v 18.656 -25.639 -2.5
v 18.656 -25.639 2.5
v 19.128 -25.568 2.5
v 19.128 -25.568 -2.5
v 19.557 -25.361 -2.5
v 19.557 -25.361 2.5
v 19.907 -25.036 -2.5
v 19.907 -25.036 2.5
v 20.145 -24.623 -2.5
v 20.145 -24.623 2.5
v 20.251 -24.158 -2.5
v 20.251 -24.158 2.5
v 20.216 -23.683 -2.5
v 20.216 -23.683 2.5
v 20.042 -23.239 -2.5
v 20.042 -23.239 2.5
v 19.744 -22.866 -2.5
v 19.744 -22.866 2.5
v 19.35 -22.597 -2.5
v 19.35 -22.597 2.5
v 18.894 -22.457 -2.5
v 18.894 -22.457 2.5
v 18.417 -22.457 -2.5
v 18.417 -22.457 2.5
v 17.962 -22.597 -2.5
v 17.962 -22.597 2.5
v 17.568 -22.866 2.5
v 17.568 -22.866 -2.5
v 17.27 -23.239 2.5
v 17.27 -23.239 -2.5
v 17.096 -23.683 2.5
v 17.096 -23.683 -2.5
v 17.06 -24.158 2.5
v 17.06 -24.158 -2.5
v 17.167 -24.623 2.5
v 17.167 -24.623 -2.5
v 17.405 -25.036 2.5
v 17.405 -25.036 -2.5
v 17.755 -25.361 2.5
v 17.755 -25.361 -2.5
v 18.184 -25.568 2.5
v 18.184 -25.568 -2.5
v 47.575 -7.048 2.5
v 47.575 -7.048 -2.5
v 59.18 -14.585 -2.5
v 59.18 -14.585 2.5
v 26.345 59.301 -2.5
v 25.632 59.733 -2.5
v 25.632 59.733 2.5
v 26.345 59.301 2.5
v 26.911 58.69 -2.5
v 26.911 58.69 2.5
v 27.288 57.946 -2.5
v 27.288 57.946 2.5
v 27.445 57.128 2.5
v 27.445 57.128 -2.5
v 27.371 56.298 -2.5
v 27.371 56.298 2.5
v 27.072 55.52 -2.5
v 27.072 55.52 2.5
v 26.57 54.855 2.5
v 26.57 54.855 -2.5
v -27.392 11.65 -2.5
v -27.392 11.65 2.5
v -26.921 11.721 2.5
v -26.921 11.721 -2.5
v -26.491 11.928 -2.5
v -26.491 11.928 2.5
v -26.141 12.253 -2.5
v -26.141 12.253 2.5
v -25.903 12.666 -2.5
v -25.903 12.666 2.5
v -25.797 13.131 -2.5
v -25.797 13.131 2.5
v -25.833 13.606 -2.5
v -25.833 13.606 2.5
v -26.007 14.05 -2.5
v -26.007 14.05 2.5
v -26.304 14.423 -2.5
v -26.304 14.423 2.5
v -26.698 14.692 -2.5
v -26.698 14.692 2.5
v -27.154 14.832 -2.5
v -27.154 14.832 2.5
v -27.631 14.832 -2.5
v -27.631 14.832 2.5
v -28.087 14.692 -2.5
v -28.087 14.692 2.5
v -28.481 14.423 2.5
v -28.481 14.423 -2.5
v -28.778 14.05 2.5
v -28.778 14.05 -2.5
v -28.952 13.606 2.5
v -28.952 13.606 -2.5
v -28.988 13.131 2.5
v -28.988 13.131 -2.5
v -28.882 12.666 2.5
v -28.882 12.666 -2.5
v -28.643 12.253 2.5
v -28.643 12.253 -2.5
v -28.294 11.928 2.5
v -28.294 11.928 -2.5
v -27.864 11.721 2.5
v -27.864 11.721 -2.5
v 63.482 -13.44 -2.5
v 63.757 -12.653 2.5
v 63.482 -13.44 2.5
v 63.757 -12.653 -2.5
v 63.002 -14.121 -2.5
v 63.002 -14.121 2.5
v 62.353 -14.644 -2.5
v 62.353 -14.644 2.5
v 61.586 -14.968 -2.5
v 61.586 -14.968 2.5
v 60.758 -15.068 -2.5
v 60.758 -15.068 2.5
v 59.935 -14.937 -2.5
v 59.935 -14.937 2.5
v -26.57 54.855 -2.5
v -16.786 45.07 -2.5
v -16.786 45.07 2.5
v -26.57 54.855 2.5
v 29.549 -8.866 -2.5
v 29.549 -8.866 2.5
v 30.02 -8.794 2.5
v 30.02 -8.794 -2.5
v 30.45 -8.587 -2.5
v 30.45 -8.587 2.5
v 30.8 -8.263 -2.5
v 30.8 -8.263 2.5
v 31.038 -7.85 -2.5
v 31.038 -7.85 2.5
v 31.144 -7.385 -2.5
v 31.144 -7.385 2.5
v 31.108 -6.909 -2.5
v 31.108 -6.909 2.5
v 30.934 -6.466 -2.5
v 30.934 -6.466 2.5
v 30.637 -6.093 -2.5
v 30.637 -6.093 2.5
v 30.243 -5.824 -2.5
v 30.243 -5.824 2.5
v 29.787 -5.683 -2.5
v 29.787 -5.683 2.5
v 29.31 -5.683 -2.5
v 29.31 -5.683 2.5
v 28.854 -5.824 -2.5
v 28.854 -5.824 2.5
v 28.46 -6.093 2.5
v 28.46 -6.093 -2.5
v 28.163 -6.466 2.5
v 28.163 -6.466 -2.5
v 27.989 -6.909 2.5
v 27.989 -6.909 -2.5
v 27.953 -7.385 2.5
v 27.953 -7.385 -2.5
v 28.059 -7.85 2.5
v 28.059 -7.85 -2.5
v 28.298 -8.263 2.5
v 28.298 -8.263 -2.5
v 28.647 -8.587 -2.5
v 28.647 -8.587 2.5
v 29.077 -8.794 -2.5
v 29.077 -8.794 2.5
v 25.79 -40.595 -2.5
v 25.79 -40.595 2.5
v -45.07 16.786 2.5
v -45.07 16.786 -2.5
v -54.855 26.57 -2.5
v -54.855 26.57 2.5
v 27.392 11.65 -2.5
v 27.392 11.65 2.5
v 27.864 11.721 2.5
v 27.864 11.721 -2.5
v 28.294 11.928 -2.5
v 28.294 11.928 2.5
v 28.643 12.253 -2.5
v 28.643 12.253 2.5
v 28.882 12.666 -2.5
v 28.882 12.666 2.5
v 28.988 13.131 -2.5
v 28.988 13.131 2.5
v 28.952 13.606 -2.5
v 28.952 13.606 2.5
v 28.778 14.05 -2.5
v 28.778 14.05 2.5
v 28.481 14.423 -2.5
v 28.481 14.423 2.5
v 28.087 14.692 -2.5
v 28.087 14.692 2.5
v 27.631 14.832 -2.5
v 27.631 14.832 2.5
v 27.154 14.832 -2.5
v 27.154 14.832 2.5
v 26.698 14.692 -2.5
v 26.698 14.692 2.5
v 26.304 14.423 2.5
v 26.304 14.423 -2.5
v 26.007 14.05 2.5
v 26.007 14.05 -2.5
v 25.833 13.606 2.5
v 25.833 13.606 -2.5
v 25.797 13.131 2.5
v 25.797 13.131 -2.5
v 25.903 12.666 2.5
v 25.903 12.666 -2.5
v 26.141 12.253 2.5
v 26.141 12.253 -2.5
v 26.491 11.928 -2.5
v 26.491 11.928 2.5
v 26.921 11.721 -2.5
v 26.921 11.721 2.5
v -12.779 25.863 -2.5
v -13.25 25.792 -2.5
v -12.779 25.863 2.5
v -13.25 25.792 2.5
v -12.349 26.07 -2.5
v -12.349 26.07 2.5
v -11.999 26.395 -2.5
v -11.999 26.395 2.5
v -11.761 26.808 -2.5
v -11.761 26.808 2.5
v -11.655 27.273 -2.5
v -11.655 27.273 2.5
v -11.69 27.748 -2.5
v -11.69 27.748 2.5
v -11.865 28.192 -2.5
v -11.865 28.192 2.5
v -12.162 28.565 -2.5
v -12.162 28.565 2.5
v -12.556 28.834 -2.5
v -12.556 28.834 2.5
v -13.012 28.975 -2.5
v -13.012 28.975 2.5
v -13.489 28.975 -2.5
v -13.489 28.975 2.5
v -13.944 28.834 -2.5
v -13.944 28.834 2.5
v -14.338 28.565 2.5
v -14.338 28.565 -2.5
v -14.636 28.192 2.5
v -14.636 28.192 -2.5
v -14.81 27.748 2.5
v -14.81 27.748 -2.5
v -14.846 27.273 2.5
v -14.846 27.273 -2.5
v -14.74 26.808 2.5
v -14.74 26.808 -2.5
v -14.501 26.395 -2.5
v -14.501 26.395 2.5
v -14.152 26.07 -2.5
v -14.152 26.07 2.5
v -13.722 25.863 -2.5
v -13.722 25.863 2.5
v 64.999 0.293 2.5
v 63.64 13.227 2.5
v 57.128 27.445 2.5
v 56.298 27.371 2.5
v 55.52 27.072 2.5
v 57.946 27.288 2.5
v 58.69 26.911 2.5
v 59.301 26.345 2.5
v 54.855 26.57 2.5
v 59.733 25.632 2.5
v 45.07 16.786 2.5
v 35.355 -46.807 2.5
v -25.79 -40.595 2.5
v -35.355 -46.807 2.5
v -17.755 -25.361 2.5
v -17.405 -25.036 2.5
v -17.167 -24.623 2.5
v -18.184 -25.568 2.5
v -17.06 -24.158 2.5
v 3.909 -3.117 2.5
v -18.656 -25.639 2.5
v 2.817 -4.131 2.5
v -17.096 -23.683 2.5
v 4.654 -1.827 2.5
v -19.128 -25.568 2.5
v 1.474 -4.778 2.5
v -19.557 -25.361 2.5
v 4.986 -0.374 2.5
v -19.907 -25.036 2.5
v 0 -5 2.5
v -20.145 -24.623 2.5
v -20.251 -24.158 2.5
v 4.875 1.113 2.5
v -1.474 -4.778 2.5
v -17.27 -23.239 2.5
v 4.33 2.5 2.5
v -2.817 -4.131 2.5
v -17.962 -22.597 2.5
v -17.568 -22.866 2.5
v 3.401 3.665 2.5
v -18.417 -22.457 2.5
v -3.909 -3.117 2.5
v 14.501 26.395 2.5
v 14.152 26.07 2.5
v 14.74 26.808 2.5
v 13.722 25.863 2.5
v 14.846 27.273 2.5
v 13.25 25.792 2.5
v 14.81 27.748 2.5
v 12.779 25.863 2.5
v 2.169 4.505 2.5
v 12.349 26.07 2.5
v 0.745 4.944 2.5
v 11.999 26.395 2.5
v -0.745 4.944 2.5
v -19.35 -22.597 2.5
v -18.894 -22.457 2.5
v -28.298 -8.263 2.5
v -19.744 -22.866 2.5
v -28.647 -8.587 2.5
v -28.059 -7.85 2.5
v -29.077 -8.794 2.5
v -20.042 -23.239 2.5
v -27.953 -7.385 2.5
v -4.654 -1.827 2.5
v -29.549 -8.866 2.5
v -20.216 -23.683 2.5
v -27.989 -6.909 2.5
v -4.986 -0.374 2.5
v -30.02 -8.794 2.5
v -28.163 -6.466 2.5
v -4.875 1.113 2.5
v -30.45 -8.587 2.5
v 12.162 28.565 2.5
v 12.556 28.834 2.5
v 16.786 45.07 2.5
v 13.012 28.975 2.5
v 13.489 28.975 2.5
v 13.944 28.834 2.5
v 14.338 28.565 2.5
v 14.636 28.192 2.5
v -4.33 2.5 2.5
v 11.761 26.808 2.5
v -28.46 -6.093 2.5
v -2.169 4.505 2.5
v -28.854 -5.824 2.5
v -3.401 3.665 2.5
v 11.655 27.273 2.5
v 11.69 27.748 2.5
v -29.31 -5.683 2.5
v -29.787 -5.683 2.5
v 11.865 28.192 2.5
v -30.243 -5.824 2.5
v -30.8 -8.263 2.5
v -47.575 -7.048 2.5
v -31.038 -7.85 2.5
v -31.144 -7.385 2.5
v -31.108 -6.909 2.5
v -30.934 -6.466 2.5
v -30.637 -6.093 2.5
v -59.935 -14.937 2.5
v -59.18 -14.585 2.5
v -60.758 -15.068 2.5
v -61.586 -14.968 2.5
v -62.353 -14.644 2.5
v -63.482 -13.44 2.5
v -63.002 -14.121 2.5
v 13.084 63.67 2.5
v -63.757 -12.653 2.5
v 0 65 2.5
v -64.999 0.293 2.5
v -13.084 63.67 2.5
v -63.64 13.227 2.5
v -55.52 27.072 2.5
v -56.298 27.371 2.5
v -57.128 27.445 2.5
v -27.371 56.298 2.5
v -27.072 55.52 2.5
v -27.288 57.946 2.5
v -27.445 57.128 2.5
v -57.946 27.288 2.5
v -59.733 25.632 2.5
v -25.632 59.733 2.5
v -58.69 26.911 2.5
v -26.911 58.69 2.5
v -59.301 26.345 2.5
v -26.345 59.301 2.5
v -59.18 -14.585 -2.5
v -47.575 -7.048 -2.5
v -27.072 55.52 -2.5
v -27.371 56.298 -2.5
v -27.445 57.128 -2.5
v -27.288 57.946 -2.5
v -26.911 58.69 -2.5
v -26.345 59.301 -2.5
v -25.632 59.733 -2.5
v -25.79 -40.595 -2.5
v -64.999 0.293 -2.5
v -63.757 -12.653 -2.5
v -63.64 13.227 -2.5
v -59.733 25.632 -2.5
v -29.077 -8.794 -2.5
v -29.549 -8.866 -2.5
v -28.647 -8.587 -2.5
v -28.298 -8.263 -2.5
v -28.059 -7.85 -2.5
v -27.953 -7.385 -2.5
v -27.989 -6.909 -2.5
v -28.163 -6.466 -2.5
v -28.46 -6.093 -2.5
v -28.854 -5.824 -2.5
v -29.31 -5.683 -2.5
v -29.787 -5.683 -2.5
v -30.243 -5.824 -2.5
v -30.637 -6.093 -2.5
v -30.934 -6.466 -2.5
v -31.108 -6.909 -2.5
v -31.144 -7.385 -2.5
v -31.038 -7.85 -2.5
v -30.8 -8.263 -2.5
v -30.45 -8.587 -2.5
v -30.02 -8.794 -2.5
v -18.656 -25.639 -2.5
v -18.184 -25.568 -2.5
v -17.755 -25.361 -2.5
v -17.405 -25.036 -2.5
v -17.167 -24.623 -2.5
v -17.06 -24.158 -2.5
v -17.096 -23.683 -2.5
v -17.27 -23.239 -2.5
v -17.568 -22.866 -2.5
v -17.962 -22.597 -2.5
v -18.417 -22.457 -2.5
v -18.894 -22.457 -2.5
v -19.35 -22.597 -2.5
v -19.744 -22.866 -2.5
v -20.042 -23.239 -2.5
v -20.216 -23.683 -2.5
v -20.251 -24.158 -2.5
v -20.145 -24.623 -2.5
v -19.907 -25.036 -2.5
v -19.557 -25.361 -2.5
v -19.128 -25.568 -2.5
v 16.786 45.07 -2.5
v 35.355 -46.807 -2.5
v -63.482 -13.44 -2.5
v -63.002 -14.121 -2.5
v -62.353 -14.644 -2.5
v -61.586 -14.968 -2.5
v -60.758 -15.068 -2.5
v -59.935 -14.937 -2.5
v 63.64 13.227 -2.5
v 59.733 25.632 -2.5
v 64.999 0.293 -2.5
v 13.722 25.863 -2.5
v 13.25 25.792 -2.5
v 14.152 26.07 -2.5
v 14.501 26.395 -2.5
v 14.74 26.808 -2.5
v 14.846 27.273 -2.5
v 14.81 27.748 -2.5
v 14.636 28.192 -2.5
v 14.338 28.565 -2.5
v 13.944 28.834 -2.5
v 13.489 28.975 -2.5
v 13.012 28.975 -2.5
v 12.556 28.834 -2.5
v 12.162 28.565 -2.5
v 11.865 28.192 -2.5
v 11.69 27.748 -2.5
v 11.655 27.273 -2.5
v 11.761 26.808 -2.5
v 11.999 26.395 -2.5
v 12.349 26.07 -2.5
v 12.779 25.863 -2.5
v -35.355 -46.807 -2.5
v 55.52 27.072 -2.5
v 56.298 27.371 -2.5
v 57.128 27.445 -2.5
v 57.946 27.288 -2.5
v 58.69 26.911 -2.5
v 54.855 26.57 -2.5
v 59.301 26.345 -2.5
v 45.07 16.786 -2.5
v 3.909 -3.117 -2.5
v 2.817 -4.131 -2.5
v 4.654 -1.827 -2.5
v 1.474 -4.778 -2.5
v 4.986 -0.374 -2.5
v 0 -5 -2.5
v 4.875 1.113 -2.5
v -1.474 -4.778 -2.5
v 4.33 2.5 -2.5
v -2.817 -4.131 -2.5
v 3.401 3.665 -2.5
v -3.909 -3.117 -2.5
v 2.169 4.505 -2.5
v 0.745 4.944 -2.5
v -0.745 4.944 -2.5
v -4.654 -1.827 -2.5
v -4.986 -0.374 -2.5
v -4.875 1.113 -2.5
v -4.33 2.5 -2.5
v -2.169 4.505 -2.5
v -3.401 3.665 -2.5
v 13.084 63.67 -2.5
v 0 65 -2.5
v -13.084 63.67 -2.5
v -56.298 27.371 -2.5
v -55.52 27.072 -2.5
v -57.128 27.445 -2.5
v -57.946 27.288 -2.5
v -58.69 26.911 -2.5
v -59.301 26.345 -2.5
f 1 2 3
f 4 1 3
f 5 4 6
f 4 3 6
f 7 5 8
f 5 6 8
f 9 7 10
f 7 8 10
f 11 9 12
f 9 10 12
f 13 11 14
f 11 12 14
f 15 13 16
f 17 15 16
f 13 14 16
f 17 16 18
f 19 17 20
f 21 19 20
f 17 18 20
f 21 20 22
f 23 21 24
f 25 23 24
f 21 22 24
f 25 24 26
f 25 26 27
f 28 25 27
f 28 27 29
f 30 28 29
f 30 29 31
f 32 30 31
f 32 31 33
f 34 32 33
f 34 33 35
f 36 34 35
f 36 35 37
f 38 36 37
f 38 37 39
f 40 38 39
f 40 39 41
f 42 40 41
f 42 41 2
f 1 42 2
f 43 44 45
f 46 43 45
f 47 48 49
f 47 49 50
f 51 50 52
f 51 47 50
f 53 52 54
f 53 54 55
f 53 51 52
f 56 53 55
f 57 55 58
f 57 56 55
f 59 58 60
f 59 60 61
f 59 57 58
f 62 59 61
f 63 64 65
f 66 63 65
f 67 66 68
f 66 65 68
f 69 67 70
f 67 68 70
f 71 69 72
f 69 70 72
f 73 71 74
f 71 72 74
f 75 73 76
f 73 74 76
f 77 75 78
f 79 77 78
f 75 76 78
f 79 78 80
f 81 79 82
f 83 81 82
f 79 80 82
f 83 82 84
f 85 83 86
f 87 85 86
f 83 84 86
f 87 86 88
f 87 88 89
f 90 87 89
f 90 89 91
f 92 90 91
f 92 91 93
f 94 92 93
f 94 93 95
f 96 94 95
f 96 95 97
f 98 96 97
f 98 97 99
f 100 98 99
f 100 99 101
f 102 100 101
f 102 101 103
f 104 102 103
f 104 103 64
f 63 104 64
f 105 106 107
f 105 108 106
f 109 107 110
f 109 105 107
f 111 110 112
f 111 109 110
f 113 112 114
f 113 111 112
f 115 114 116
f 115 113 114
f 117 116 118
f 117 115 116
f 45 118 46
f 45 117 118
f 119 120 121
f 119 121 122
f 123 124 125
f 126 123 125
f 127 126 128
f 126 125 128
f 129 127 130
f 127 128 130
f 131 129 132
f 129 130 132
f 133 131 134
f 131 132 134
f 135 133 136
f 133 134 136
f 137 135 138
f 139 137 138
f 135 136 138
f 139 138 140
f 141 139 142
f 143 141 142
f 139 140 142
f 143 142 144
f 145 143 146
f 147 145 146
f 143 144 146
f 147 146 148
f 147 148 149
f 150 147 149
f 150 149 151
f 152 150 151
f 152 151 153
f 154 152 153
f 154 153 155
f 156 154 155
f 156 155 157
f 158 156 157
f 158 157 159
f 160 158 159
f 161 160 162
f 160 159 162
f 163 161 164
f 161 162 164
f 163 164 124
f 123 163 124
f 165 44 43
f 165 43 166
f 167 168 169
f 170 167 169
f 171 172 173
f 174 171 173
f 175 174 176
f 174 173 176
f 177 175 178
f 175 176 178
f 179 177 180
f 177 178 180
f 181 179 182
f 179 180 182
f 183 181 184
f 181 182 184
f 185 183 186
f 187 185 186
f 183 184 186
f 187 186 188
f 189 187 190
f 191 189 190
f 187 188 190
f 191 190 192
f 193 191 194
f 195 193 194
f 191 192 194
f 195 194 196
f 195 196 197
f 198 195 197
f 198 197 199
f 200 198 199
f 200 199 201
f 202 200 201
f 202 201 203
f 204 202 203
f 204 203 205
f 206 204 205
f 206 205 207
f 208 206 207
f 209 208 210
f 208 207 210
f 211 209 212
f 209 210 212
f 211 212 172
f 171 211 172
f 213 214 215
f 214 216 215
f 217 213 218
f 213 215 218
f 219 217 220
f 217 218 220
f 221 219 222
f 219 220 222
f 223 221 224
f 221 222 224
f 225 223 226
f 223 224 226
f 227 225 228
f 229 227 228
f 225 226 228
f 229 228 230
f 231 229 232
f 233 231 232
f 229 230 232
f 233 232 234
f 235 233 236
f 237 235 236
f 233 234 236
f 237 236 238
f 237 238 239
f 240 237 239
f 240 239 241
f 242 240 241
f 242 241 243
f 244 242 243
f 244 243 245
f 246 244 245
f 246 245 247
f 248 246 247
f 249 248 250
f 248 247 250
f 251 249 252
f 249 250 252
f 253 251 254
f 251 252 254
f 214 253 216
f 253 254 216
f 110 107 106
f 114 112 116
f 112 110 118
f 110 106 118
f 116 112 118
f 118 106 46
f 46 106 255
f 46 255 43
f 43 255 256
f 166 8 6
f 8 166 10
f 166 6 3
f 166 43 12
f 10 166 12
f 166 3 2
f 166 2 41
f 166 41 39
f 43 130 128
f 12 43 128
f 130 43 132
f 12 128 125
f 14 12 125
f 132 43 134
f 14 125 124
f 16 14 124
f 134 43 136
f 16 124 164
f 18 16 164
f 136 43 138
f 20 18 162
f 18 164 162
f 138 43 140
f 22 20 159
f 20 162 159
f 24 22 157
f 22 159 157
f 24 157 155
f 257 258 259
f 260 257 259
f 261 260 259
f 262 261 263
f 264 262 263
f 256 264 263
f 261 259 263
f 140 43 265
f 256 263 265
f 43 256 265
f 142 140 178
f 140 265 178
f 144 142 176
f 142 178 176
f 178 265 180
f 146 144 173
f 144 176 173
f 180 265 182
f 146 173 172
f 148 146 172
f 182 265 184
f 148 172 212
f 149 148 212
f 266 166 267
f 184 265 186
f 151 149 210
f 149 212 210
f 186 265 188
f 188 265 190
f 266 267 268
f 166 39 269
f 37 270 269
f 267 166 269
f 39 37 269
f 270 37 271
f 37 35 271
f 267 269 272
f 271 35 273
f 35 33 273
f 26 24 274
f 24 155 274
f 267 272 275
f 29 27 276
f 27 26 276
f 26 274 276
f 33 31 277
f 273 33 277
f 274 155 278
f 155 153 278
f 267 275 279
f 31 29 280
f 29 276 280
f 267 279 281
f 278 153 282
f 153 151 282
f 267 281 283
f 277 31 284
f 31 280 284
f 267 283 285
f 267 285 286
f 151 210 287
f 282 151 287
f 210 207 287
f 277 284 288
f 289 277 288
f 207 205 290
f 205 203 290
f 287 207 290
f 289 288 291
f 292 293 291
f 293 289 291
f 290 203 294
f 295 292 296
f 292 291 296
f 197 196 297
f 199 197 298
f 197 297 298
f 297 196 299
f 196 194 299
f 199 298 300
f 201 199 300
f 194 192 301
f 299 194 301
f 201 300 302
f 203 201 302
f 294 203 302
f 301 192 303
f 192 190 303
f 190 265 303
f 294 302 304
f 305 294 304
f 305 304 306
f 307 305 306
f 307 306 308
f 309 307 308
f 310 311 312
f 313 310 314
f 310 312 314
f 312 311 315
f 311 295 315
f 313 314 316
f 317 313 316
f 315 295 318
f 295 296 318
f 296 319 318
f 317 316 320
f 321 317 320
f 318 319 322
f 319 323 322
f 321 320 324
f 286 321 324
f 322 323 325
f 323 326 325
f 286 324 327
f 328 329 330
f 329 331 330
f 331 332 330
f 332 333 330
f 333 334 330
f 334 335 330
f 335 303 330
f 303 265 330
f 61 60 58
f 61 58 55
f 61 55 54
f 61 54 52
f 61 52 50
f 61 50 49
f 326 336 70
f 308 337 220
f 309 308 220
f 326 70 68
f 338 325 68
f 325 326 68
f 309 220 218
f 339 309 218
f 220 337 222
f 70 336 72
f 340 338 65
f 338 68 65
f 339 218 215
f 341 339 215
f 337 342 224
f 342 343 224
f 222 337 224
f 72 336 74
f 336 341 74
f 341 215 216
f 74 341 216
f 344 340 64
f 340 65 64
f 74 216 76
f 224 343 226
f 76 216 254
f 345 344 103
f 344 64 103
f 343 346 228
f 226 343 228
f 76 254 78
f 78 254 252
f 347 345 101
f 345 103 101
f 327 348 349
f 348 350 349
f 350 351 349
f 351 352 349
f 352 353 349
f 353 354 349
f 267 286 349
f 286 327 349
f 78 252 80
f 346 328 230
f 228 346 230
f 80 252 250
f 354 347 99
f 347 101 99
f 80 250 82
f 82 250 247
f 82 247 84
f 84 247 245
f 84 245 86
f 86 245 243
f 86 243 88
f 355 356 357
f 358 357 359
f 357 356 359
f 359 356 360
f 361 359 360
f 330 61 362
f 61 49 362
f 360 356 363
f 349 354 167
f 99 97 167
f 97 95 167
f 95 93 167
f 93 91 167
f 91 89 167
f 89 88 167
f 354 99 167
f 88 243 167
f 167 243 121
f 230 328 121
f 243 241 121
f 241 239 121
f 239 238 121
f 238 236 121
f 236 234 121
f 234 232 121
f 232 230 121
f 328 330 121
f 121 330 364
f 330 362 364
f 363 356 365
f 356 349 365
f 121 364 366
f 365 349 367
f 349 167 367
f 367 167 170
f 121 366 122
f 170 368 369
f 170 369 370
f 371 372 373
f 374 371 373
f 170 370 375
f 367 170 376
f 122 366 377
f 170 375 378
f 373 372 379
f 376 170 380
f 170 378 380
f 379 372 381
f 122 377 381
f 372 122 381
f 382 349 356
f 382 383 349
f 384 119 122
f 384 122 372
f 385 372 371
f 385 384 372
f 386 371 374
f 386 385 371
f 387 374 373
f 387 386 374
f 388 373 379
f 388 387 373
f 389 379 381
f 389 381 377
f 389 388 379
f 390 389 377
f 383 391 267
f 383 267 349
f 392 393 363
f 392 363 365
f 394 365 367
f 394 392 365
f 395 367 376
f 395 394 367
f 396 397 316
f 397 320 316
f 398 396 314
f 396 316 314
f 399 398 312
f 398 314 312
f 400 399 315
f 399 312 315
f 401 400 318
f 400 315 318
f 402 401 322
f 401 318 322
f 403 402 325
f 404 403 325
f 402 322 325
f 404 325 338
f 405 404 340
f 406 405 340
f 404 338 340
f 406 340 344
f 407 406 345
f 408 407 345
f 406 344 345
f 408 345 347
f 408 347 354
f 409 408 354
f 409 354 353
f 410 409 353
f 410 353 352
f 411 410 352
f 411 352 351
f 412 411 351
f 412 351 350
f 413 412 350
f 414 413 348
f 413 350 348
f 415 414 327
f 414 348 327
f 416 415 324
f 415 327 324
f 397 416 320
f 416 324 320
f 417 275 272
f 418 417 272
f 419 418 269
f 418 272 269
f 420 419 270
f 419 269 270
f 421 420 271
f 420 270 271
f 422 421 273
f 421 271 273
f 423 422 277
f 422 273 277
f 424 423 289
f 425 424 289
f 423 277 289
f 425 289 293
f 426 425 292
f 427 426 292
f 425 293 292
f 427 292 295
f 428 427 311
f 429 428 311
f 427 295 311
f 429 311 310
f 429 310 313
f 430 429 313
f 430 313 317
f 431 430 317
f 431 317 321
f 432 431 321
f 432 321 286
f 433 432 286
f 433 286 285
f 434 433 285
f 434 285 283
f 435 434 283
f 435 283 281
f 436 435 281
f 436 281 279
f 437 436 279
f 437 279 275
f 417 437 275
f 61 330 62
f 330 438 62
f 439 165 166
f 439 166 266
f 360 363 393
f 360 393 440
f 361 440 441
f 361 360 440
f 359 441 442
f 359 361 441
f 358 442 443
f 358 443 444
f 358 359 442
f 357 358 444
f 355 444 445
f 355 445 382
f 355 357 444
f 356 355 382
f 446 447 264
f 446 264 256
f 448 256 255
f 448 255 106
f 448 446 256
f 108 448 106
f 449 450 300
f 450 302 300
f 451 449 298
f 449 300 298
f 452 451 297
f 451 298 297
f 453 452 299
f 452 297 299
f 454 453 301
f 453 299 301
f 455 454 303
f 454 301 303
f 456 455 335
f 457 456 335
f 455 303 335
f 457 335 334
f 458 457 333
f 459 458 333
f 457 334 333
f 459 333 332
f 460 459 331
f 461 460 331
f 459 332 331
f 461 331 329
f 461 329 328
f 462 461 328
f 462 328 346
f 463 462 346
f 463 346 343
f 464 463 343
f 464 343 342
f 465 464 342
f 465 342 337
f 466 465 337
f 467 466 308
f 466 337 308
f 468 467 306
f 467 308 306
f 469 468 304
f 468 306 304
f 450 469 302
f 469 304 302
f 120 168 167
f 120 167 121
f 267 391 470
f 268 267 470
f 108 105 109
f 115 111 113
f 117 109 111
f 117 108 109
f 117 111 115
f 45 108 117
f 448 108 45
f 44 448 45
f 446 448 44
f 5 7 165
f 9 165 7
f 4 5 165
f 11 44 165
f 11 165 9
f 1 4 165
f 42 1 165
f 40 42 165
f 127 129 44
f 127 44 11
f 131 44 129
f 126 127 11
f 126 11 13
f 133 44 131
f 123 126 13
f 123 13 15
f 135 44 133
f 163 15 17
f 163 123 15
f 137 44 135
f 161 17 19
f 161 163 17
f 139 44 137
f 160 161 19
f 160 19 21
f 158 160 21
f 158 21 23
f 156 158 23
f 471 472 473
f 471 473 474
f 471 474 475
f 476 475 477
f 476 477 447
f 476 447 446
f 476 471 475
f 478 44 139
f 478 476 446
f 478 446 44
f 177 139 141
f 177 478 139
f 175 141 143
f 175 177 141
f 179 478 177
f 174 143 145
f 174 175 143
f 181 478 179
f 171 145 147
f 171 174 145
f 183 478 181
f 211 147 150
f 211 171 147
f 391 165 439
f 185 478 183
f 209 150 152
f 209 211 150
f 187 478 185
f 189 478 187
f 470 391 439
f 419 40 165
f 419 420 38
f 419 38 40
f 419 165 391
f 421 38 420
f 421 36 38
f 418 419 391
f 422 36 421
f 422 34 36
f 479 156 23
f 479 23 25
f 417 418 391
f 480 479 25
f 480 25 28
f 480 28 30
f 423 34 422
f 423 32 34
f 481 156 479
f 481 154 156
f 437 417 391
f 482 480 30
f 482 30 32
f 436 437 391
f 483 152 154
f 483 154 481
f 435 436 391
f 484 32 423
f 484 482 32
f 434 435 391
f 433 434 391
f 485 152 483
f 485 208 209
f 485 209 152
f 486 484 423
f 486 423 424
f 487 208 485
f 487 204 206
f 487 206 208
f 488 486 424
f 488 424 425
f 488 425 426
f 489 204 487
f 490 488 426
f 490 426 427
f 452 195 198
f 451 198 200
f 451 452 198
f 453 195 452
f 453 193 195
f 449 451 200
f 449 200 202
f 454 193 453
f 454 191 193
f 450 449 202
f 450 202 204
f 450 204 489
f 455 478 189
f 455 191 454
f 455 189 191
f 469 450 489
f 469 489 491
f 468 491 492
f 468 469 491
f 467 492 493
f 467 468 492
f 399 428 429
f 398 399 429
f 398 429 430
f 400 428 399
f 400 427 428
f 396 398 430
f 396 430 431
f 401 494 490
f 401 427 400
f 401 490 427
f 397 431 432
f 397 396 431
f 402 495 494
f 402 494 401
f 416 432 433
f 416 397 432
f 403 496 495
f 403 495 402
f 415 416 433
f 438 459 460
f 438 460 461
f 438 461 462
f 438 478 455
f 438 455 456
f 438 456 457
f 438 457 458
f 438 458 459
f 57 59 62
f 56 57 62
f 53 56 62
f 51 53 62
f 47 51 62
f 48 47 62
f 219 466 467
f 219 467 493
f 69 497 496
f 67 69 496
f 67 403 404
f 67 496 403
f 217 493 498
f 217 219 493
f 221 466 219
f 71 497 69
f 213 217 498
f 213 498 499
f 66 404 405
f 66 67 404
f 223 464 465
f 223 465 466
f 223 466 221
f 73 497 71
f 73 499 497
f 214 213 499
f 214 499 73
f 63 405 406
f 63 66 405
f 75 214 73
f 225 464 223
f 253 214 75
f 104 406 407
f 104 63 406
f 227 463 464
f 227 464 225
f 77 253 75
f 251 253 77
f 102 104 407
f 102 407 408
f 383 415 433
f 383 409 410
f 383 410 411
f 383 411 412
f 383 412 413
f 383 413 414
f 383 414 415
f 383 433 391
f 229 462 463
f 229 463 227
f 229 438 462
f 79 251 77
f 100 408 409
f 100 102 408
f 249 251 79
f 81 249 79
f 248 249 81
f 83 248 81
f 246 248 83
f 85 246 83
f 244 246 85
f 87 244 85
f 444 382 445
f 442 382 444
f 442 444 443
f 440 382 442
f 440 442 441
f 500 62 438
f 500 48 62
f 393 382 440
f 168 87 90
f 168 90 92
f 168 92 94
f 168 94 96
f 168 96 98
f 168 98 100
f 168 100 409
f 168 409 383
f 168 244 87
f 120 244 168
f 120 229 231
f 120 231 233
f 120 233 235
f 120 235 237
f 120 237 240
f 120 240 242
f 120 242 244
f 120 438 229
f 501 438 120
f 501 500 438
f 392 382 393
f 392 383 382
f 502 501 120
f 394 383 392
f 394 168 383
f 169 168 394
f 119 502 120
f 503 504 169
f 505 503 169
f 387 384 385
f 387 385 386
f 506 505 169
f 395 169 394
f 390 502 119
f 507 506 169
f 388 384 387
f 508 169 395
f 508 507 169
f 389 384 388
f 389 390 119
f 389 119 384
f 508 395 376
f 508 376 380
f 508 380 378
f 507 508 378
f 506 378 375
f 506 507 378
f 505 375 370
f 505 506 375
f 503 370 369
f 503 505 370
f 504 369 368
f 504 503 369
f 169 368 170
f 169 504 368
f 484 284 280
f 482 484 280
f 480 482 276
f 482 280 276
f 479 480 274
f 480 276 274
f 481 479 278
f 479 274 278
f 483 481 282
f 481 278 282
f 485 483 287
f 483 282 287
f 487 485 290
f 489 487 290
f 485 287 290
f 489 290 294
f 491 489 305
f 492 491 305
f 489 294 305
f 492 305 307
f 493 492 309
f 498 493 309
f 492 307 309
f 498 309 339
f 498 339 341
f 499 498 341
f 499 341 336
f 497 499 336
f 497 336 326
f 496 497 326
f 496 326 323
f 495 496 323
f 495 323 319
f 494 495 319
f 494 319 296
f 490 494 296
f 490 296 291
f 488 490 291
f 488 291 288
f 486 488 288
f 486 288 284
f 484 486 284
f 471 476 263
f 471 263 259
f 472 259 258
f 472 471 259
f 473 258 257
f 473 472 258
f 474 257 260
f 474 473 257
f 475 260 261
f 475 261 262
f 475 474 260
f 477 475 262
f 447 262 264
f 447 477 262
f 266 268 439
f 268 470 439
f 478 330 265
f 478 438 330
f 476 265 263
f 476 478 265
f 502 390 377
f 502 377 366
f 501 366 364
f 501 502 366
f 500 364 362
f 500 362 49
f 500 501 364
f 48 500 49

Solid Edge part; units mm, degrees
sketch "Sketch1" plane through (0, 0, 0) normal (0, 0, 1) x (1, 0, 0)
  arc A0 (-62.7617, -16.9107) -> (-57.8743, 29.59) centre (0, 0) cw
  line L0 (-45.07, 16.7858) -> (-57.8743, 29.59)
  line L1 (-45.07, 16.7858) -> (-16.7858, 45.07)
  line L2 (-16.7858, 45.07) -> (-29.59, 57.8743)
  arc A1 (-29.59, 57.8743) -> (29.59, 57.8743) centre (0, 0) cw
  line L3 (16.7858, 45.07) -> (29.59, 57.8743)
  line L4 (16.7858, 45.07) -> (45.07, 16.7858)
  line L5 (45.07, 16.7858) -> (57.8743, 29.59)
  arc A2 (57.8743, 29.59) -> (62.7617, -16.9107) centre (0, 0) cw
  line L6 (47.5751, -7.0484) -> (62.7617, -16.9107)
  line L7 (47.5751, -7.0484) -> (25.7895, -40.5952)
  line L8 (25.7895, -40.5952) -> (35.3554, -46.8074)
  line L9 (-35.3554, -46.8074) -> (35.3554, -46.8074)
  line L10 (-25.7895, -40.5952) -> (-35.3554, -46.8074)
  line L11 (-25.7895, -40.5952) -> (-47.5751, -7.0484)
  line L12 (-47.5751, -7.0484) -> (-62.7617, -16.9107)
extrude "ProtrusiónExtruida_1" add sketch "Sketch1" along normal mid plane 5
fillet "Round1" [suppressed]
hole "Agujero_1" at (-13.2502, 27.3924, 2.5) direction (0, 0, -1) diameter 3.2 end up to next
hole "Hole1" at (-27.3924, 13.2502, 2.5) direction (0, 0, -1) diameter 3.2 end up to next
hole "Hole2" at (-29.5486, -7.2655, 2.5) direction (0, 0, -1) diameter 3.2 end up to next
hole "Hole3" at (-18.6559, -24.0389, 2.5) direction (0, 0, -1) diameter 3.2 end up to next
hole "Hole4" at (13.2502, 27.3924, 2.5) direction (0, 0, -1) diameter 3.2 end up to next
hole "Hole5" at (27.3924, 13.2502, 2.5) direction (0, 0, -1) diameter 3.2 end up to next
hole "Hole6" at (29.5486, -7.2655, 2.5) direction (0, 0, -1) diameter 3.2 end up to next
hole "Hole7" at (18.6559, -24.0389, 2.5) direction (0, 0, -1) diameter 3.2 end up to next
fillet "Redondeo_4" radius 3 6 edges at (-62.7617, -16.9107, 0) (29.59, 57.8743, 0) (62.7617, -16.9107, 0) (57.8743, 29.59, 0) (-57.8743, 29.59, 0) (-29.59, 57.8743, 0)
hole "Agujero_9" at (0, 0, 2.5) direction (0, 0, -1) diameter 10 end up to next
